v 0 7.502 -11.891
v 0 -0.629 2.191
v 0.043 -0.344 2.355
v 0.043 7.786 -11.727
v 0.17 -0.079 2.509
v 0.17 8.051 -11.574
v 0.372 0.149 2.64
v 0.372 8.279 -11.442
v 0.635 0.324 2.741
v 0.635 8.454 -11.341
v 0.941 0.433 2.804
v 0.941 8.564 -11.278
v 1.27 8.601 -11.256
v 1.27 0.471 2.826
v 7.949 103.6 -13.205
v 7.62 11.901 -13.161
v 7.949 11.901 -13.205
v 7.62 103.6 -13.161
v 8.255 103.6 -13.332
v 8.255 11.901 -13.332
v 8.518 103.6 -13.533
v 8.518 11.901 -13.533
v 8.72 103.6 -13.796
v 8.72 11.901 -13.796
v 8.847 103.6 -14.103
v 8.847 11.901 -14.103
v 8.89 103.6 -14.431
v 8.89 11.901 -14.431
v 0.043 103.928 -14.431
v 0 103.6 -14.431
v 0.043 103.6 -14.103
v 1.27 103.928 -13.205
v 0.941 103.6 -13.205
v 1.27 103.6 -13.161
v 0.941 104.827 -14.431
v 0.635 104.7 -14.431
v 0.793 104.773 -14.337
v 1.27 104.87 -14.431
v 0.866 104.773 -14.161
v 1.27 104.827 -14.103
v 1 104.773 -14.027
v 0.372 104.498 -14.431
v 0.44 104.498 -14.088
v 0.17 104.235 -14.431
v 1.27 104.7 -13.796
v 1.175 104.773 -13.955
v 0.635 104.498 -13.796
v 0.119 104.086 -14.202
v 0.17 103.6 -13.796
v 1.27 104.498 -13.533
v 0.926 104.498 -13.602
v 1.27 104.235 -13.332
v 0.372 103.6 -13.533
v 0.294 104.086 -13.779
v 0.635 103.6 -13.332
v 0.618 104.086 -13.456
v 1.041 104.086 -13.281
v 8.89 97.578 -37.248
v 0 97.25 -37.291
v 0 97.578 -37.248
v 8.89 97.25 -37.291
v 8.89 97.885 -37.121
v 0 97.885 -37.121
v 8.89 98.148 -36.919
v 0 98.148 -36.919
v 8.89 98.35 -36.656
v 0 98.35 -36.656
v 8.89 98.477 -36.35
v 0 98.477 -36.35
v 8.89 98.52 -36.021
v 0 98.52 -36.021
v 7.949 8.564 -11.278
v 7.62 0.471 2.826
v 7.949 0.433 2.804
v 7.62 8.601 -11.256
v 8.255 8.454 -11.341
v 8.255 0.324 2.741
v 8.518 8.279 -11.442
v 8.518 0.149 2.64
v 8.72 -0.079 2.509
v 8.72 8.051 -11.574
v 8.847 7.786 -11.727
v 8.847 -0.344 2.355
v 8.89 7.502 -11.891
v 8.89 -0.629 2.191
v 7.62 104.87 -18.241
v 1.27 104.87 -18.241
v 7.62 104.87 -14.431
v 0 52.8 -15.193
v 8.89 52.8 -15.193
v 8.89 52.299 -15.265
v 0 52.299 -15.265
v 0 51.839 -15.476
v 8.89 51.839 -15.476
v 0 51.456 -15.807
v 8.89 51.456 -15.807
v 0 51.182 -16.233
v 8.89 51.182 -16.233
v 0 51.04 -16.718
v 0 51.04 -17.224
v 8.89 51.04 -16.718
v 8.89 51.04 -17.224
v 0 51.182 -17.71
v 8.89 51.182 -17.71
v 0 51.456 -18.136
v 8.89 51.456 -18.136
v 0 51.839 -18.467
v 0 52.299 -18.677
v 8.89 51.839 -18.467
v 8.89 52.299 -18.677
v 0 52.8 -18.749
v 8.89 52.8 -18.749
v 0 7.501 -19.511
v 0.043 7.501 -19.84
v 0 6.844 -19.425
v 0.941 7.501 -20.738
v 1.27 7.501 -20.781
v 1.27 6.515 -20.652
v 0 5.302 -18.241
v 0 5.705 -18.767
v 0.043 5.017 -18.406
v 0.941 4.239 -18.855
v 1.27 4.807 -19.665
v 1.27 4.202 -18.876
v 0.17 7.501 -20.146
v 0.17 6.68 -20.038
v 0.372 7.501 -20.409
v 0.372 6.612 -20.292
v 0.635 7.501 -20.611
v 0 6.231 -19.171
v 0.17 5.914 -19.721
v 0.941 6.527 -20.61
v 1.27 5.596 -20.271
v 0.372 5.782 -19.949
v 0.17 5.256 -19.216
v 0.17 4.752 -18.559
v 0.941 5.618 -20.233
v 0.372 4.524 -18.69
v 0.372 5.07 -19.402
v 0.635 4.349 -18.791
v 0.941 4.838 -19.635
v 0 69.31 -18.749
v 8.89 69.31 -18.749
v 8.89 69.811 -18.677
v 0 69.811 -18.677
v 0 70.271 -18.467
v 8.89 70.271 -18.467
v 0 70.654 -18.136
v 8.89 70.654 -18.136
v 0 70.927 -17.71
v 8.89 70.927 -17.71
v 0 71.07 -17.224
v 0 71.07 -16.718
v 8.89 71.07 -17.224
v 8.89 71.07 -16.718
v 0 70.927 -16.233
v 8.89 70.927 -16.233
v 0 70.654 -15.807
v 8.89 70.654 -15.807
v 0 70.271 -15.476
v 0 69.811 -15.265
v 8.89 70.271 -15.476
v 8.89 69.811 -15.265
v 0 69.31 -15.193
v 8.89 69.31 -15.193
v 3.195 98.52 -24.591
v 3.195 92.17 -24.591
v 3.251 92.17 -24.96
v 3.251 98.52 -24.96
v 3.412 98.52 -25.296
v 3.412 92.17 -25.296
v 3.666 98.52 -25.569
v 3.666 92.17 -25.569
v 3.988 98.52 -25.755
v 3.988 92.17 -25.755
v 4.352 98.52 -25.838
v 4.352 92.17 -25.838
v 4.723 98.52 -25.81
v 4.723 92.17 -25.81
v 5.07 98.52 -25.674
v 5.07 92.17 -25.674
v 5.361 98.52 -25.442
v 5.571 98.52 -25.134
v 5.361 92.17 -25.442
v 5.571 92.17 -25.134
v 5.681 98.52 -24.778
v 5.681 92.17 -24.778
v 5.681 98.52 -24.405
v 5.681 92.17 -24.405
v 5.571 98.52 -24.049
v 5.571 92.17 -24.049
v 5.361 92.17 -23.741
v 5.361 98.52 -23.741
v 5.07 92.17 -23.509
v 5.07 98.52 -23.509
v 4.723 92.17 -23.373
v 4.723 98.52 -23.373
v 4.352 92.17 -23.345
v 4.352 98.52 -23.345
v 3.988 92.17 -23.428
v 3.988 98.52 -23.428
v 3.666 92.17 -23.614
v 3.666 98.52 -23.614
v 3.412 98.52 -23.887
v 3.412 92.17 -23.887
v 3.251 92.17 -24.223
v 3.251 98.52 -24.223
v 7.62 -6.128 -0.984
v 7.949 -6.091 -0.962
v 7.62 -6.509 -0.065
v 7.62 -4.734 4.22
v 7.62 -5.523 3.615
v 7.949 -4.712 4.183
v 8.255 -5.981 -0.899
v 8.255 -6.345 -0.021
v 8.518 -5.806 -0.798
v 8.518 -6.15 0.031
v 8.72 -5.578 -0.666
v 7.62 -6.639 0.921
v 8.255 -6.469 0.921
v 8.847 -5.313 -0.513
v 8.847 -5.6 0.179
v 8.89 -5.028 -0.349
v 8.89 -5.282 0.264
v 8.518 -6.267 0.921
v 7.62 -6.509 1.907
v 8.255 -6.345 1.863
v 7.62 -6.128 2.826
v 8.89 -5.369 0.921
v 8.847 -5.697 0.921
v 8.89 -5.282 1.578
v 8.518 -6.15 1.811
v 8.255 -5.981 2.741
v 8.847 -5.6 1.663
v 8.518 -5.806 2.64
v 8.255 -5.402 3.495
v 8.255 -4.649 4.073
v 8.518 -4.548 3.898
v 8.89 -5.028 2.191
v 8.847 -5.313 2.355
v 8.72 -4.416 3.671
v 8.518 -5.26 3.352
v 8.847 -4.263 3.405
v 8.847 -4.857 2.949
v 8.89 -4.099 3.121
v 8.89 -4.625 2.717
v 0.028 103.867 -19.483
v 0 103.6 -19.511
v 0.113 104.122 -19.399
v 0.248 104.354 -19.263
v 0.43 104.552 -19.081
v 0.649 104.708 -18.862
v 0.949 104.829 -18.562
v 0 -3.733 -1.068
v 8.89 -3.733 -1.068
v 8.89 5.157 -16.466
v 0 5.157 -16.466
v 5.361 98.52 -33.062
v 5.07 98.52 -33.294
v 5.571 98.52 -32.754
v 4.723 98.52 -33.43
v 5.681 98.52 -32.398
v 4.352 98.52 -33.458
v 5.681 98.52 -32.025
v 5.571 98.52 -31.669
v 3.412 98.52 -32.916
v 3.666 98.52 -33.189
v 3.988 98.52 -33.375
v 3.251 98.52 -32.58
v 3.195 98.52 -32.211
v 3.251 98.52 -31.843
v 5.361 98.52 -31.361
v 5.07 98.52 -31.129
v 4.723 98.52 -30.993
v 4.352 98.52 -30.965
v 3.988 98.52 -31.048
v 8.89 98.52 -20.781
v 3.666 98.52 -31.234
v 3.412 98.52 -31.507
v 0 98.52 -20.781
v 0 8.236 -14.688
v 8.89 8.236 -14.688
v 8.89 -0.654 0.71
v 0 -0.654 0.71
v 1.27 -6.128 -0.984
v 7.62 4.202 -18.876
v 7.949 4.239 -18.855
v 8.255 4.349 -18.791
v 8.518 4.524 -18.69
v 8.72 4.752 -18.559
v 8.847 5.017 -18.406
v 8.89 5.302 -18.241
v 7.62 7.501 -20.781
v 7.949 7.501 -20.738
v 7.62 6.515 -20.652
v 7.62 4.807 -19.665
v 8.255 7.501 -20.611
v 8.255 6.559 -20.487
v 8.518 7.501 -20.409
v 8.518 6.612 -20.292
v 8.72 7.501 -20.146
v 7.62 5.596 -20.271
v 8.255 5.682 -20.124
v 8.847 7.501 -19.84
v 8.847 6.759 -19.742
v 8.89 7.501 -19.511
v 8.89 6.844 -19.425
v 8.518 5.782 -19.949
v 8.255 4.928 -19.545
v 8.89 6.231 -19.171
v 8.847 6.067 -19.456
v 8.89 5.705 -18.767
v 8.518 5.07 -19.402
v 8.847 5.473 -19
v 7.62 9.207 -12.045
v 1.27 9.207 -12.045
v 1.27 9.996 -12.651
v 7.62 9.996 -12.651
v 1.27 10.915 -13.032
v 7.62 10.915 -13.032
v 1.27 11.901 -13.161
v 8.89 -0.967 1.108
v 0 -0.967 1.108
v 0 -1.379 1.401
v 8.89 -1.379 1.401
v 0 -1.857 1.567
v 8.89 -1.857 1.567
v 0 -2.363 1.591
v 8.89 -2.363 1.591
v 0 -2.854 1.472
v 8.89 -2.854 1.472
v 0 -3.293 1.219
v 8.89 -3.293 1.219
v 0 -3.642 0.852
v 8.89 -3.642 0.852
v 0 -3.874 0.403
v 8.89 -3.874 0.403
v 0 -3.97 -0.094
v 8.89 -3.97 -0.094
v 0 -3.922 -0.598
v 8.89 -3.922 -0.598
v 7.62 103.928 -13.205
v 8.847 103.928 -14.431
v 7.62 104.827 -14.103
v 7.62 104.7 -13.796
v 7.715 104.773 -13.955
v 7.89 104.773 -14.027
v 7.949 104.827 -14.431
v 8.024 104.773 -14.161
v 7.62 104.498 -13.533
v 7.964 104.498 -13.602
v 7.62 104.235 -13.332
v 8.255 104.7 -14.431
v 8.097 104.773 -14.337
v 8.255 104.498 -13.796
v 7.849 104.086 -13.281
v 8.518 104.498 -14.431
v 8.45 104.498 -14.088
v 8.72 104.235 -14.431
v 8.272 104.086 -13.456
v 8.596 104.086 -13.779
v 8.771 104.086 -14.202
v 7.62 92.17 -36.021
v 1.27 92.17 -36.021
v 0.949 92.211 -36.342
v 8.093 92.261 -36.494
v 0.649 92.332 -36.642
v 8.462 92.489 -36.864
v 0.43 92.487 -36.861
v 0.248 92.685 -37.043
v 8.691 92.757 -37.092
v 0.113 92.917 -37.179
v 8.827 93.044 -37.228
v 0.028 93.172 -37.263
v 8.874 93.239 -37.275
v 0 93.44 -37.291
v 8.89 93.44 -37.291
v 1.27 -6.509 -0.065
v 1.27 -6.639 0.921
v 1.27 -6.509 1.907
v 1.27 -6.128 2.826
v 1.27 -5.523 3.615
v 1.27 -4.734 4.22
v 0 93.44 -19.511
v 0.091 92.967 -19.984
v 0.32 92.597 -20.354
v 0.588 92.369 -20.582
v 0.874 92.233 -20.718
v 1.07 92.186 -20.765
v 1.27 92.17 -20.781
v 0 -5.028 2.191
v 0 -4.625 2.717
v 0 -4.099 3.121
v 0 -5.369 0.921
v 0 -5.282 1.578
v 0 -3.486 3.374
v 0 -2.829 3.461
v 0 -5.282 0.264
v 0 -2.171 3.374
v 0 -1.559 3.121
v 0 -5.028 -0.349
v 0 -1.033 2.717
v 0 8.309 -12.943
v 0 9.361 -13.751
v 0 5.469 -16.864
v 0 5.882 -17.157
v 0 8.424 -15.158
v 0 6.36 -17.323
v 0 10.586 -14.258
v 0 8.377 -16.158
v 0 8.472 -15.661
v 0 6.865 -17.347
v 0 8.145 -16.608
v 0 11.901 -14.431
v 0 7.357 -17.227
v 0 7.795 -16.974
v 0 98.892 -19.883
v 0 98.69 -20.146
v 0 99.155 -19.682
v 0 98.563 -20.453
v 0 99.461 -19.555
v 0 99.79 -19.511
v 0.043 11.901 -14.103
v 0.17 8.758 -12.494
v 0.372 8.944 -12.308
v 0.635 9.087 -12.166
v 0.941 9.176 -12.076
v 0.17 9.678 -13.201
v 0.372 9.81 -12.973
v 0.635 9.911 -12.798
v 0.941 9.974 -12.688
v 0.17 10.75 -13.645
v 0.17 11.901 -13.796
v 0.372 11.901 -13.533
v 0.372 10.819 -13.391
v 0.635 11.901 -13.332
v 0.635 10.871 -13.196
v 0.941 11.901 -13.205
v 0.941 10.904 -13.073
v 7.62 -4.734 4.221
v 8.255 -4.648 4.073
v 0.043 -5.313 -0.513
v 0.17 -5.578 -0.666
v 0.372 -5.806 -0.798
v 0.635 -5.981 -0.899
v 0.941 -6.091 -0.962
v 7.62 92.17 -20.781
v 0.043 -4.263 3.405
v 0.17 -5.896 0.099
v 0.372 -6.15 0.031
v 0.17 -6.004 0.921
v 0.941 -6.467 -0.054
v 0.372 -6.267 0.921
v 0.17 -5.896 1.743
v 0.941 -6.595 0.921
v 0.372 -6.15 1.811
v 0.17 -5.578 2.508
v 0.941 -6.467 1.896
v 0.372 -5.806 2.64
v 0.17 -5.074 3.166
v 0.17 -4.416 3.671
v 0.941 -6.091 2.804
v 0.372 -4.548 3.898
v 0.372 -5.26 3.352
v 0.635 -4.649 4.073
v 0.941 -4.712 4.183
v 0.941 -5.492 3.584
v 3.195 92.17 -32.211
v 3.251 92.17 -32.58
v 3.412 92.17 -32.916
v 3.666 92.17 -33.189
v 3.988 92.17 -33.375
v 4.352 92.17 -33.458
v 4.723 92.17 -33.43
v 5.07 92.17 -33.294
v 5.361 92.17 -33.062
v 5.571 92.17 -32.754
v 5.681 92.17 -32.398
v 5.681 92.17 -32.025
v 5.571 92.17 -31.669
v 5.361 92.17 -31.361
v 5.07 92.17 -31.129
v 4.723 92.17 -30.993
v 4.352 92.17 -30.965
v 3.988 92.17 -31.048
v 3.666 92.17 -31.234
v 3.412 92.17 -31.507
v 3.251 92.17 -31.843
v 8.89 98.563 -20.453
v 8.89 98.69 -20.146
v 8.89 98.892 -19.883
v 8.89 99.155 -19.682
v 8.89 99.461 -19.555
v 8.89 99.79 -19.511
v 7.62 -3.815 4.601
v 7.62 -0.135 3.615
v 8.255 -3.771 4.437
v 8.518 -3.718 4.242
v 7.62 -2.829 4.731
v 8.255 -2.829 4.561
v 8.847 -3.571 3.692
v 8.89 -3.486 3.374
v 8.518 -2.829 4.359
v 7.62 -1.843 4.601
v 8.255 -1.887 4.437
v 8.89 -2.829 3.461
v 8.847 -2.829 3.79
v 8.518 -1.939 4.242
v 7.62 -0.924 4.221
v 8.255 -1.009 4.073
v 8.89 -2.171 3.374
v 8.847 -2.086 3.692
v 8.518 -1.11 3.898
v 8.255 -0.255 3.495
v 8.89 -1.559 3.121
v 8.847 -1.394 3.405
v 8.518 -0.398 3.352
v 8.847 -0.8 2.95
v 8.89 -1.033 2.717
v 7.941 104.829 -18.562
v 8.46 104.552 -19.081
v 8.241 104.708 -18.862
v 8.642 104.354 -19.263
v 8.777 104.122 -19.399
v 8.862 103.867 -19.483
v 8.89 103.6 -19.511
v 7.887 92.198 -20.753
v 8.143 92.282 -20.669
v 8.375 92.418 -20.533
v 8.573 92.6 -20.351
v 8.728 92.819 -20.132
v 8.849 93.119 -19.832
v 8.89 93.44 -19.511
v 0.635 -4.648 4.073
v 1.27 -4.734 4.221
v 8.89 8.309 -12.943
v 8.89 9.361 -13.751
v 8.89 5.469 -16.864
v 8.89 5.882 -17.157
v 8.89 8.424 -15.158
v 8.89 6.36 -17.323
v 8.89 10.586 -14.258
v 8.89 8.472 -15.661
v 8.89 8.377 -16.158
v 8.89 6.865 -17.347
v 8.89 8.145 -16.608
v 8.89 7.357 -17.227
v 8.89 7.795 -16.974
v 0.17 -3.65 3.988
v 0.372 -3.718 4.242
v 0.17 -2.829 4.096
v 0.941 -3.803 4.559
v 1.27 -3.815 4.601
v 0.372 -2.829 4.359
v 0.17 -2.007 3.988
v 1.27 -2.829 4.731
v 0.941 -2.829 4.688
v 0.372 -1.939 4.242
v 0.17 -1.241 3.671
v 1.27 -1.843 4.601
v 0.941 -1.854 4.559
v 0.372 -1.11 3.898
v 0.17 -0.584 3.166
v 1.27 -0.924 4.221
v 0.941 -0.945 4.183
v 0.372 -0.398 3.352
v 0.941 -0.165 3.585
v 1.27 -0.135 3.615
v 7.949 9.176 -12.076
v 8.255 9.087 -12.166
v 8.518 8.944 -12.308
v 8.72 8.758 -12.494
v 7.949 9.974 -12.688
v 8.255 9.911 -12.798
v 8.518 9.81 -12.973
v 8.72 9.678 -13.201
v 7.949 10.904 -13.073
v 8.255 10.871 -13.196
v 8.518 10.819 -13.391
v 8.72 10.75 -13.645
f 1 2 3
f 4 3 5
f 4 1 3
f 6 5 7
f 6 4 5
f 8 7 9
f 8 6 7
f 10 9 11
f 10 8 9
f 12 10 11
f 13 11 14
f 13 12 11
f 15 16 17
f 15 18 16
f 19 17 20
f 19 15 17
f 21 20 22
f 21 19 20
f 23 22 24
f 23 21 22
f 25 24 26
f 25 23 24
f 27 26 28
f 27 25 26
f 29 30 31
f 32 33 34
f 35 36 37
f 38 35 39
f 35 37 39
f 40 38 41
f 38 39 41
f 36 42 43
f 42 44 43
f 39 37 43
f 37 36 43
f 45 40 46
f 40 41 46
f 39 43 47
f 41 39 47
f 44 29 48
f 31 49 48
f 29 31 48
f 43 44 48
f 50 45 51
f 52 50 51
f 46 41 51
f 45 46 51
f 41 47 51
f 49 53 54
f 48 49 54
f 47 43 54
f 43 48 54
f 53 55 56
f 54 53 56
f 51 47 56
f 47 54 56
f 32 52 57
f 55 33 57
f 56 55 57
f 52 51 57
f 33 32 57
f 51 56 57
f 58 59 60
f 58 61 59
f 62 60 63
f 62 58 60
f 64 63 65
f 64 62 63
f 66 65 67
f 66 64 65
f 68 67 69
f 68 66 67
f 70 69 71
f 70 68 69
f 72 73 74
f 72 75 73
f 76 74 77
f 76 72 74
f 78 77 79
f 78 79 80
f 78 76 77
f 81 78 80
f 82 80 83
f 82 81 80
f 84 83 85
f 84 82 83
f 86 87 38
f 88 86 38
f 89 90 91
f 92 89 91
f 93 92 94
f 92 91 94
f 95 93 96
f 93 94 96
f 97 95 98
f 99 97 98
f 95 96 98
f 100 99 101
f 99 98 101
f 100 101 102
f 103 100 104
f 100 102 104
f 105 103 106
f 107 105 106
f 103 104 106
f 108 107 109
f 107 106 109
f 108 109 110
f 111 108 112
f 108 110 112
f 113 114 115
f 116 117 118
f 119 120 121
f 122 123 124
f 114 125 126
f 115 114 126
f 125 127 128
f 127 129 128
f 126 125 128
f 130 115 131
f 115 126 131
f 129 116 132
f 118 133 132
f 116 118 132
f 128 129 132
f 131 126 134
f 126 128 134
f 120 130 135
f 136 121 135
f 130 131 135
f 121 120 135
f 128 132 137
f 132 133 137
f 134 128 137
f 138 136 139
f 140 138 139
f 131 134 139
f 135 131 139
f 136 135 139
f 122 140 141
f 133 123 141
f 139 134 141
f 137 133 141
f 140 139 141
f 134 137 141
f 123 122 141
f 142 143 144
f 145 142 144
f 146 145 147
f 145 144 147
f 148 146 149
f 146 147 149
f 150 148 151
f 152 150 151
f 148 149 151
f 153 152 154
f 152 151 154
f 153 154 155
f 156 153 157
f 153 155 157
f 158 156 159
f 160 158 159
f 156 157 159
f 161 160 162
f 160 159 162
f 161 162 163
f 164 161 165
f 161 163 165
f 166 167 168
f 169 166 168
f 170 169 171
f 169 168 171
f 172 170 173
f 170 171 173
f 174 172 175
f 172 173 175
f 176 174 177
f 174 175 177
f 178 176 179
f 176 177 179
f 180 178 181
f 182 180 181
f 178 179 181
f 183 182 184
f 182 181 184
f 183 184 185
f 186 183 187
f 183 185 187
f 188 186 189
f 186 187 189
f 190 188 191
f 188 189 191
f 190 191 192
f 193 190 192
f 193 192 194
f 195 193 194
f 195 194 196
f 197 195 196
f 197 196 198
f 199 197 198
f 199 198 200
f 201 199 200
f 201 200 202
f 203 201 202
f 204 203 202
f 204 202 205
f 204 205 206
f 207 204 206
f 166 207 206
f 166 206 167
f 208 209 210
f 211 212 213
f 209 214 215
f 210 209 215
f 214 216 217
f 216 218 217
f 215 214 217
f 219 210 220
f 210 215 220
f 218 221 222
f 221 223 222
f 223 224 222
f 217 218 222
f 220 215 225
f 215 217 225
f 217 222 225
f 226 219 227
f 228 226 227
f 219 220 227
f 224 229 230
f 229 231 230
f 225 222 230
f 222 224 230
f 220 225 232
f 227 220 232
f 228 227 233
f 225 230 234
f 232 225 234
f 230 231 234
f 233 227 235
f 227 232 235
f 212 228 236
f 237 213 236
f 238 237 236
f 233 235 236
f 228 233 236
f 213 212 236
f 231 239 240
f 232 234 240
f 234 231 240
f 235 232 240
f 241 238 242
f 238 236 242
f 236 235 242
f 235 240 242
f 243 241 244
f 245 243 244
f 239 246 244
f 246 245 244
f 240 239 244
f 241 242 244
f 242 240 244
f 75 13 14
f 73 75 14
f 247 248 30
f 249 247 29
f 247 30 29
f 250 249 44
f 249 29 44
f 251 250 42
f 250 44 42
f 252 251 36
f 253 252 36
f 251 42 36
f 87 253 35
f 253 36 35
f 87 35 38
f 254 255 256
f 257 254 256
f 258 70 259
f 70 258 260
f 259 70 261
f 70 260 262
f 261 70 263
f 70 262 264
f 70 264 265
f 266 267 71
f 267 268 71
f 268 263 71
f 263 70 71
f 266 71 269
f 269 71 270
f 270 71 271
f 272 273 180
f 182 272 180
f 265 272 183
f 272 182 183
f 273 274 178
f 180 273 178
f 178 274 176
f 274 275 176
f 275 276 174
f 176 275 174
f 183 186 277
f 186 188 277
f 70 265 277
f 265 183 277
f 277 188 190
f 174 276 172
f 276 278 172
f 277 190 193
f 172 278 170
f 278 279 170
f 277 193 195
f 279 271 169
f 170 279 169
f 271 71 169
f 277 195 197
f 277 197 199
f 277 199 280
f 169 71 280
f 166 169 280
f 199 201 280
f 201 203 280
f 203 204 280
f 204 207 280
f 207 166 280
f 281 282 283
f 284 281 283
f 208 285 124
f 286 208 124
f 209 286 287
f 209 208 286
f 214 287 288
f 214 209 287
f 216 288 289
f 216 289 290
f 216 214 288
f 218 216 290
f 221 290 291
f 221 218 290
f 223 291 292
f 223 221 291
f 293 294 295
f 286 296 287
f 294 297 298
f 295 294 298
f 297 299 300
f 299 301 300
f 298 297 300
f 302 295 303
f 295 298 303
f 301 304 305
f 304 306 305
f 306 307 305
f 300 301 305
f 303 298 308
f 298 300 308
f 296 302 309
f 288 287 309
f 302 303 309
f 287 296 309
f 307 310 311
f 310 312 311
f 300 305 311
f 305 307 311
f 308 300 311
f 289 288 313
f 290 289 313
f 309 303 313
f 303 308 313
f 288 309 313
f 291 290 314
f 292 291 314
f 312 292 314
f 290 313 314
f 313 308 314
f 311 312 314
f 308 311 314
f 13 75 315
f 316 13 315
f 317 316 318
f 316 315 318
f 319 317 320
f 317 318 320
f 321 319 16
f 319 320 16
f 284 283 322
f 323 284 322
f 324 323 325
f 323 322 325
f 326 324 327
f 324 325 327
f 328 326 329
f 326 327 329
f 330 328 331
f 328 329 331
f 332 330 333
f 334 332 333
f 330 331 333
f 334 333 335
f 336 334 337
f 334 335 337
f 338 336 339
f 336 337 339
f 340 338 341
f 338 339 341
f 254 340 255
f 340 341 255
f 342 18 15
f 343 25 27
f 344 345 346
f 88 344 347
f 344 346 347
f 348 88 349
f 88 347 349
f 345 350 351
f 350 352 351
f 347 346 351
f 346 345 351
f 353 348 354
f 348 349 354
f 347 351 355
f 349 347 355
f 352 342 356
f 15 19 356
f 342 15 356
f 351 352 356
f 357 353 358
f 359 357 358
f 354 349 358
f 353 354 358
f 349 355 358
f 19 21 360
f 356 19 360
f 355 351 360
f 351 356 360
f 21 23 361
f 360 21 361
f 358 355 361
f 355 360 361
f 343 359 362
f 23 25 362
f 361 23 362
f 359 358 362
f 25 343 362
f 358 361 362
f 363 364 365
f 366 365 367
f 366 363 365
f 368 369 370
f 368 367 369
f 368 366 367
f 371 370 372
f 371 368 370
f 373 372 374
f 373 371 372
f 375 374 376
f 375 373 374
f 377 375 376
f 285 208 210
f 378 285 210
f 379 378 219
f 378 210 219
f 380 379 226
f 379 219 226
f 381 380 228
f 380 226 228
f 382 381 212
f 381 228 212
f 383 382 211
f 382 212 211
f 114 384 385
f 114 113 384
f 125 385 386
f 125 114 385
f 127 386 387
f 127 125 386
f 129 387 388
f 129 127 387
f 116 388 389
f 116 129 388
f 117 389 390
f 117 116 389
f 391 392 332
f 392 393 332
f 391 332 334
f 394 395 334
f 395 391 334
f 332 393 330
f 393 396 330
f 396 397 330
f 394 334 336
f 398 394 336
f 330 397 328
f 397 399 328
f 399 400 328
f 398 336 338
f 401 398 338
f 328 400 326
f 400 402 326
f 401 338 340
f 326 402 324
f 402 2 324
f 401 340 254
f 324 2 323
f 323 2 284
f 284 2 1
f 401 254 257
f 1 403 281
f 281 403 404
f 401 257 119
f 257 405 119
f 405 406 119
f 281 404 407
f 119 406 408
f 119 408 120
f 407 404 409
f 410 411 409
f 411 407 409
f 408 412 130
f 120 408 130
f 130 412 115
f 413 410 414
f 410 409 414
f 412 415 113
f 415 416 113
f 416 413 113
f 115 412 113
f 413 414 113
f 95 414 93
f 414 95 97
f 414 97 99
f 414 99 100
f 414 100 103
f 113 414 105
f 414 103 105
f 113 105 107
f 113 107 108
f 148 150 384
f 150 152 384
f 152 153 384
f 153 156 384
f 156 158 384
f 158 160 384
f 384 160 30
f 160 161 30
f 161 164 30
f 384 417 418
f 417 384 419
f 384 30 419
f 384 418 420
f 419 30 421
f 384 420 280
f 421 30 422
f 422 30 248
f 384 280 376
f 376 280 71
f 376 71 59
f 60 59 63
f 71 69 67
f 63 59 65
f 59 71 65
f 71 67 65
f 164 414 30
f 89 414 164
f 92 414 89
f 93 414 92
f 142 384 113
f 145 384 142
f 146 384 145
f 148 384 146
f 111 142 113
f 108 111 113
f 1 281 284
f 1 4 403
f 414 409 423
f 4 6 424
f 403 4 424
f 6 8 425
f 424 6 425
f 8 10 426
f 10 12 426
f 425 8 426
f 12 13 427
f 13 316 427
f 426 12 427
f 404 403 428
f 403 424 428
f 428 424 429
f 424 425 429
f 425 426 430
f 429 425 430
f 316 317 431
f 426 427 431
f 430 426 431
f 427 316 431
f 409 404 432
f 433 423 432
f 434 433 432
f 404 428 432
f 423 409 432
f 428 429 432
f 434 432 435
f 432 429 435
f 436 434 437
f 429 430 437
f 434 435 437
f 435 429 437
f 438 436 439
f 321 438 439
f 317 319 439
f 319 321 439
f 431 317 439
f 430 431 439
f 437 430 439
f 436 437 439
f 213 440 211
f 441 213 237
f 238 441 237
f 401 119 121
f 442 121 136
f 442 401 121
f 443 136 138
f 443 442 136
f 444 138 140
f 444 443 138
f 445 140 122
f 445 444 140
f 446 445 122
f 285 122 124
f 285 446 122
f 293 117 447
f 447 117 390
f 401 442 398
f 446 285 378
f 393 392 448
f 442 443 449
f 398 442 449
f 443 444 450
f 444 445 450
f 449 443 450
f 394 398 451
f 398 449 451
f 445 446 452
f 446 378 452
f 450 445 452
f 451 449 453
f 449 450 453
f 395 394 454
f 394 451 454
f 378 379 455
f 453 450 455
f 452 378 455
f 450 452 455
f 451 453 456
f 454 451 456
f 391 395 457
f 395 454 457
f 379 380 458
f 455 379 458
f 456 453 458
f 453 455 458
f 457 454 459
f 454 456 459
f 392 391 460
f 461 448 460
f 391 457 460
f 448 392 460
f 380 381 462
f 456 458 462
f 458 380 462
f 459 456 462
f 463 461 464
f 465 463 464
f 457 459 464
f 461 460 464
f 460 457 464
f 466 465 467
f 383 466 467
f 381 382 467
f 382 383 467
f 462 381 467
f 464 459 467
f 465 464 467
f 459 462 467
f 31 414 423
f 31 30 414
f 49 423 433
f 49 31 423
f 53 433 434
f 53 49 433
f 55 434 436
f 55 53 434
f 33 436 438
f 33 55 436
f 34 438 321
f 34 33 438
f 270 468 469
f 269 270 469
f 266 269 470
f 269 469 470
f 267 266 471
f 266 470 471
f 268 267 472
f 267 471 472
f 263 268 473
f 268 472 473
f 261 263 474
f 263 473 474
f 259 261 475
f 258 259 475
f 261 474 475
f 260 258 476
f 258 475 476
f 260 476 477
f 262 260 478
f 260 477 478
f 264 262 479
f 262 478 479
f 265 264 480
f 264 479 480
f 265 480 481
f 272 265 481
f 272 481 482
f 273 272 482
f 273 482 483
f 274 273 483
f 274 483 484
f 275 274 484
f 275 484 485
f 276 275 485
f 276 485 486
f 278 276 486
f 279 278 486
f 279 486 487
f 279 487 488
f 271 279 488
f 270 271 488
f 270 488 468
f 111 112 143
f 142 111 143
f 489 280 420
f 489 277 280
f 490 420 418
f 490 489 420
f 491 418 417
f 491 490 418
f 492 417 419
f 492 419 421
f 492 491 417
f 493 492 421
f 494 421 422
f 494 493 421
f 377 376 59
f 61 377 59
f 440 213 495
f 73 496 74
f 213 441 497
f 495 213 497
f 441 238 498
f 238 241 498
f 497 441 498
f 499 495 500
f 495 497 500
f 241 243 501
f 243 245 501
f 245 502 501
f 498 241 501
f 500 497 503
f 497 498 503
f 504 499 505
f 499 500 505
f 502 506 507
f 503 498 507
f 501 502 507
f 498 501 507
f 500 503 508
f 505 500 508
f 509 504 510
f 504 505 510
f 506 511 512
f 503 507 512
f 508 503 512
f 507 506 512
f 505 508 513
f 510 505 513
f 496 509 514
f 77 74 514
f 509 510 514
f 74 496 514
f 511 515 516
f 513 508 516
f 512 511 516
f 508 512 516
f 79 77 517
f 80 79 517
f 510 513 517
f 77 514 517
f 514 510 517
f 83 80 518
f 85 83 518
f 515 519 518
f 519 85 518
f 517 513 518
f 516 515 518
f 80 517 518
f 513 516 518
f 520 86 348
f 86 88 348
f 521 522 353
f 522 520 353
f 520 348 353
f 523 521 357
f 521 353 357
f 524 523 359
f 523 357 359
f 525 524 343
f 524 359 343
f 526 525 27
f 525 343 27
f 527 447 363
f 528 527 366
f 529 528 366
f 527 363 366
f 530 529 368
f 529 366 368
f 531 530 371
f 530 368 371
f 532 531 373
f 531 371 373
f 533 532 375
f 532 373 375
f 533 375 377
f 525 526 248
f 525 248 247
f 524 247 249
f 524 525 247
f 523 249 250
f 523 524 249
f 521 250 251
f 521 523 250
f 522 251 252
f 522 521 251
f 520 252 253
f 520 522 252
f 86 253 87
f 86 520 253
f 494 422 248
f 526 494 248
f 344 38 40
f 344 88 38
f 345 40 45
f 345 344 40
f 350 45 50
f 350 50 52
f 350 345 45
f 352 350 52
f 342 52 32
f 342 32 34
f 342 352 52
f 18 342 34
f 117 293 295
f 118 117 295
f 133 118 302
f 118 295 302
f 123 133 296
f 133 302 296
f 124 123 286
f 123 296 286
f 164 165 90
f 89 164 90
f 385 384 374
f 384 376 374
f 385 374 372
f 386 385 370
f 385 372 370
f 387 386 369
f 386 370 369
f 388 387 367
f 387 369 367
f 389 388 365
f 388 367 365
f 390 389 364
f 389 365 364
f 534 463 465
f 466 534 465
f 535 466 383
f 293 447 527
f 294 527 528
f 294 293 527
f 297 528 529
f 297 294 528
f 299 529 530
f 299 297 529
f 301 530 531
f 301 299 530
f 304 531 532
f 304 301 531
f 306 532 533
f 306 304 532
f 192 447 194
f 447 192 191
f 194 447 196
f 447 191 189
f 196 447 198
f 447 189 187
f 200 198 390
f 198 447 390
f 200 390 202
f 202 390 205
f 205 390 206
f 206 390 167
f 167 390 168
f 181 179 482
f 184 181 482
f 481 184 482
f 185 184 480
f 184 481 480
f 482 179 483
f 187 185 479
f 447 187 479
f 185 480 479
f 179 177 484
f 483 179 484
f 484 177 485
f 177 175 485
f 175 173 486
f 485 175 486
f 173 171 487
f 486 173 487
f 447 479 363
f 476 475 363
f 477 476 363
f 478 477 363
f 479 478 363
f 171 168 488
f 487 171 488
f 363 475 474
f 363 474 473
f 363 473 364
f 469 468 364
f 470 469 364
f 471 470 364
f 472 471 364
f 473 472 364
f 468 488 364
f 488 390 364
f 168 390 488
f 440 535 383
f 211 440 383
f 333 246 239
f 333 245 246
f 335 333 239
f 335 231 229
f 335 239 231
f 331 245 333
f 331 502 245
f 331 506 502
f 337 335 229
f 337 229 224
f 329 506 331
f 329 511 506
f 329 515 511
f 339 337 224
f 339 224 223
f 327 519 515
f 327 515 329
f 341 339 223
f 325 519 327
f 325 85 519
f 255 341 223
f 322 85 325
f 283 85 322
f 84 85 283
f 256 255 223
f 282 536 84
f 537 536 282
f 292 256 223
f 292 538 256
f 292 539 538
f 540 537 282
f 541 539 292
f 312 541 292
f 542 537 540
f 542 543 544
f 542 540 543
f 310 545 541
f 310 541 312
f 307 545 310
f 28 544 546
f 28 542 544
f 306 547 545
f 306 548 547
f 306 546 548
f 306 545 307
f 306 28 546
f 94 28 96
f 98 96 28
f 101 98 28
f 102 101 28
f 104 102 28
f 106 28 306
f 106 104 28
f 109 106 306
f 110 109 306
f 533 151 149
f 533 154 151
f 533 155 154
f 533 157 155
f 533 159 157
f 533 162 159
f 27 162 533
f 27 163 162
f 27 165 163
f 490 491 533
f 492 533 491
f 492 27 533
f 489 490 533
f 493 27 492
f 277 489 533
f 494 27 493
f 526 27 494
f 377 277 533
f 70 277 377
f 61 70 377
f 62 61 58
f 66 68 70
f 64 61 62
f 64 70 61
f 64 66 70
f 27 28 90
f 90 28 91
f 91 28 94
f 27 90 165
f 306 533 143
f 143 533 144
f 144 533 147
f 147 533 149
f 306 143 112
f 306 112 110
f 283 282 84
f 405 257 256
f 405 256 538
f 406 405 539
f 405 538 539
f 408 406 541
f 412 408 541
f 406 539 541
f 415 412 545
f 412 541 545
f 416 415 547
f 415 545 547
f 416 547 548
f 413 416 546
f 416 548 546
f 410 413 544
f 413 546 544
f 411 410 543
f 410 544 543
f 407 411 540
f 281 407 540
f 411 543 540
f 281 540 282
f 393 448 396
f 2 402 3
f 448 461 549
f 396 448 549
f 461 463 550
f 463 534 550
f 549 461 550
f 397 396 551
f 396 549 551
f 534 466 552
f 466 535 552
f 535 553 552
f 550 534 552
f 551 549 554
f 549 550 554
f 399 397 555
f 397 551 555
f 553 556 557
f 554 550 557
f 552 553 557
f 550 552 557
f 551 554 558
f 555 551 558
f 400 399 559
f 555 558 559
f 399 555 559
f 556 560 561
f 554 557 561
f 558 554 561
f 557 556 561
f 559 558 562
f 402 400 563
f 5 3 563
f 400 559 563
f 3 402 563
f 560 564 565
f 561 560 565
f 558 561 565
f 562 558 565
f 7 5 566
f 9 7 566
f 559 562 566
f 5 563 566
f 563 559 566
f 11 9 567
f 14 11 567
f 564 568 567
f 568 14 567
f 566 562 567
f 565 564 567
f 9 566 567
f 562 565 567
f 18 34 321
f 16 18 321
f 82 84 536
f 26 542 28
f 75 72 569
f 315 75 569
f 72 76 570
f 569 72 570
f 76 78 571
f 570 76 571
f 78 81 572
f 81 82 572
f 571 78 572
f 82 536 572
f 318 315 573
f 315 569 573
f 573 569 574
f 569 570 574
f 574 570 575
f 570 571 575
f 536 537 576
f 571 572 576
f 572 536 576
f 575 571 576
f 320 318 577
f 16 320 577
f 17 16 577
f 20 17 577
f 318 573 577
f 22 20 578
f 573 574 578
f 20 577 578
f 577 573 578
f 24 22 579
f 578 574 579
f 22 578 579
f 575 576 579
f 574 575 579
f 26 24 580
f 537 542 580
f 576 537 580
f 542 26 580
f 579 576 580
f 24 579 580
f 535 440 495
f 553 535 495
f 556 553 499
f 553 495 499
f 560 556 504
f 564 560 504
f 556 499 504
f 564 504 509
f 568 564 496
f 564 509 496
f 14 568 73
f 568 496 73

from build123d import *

# Parameters (mm, degrees)
BOSS_EXTRUDE1_DEPTH     = 8.89
CUT_EXTRUDE1_DEPTH      = 10.16
CUT_EXTRUDE2_DEPTH      = 10.16
TAP_DRILL_FOR_M3_TAP1_D = 2.5
FILLET5_R               = 1.27
FILLET6_R               = 3.81
FILLET7_R               = 1.27


with BuildPart() as part:
    # Sketch1 → Boss-Extrude1 (new body)
    with BuildSketch(Plane(origin=(0, 0, 0), x_dir=(0, 0, -1), z_dir=(1, 0, 0))):
        Polygon((-2.31554316, -8.033202767), (20.781354359, 5.301797233), (20.781354359, 92.169797233), (37.291354359, 92.169797233), (37.291354359, 98.519797233), (19.511354359, 98.519797233), (19.511354359, 104.869797233), (13.161354359, 104.869797233), (13.161354359, 9.701206284), (-6.12554316, -1.43408919), align=None)
    extrude(amount=BOSS_EXTRUDE1_DEPTH)

    # Sketch2 → Cut-Extrude1 (cut)
    with BuildSketch(Plane(origin=(8.89, 0, 0), x_dir=(0, 0, -1), z_dir=(1, 0, 0))):
        with BuildLine():
            Line((1.067865891, -3.733439147), (16.465797571, 5.156560853))
            ThreePointArc((16.465797571, 5.156560853), (17.116590739, 7.585354021), (14.687797571, 8.236147189))
            Line((14.687797571, 8.236147189), (-0.710134109, -0.653852811))
            ThreePointArc((-0.710134109, -0.653852811), (-1.360927276, -3.082645979), (1.067865891, -3.733439147))
        make_face()
    extrude(amount=-CUT_EXTRUDE1_DEPTH, mode=Mode.SUBTRACT)

    # Sketch3 → Cut-Extrude2 (cut)
    with BuildSketch(Plane(origin=(8.89, 0, 0), x_dir=(0, 0, -1), z_dir=(1, 0, 0))):
        with BuildLine():
            Line((15.193354359, 69.309797233), (15.193354359, 52.799797233))
            ThreePointArc((15.193354359, 52.799797233), (16.971354359, 51.021797233), (18.749354359, 52.799797233))
            Line((18.749354359, 52.799797233), (18.749354359, 69.309797233))
            ThreePointArc((18.749354359, 69.309797233), (16.971354359, 71.087797233), (15.193354359, 69.309797233))
        make_face()
    extrude(amount=-CUT_EXTRUDE2_DEPTH, mode=Mode.SUBTRACT)

    # Tap Drill for M3 Tap1 (through all)
    with Locations(Plane(origin=(0, 98.519797233, 0), x_dir=(1, 0, 0), z_dir=(0, 1, 0))):
        with Locations((4.445, 32.211354359), (4.445, 24.591354359)):
            Hole(TAP_DRILL_FOR_M3_TAP1_D / 2)

    # Fillet5
    fillet5_edges = [part.edges().sort_by_distance(p)[0] for p in [
        (4.445, 98.519797233, -19.511354359),
        (4.445, 98.519797233, -37.291354359),
    ]]
    fillet(fillet5_edges, radius=FILLET5_R)

    # Fillet6
    fillet6_edges = [part.edges().sort_by_distance(p)[0] for p in [
        (4.445, 9.701206284, -13.161354359),
        (4.445, 5.301797233, -20.781354359),
        (4.445, -8.033202767, 2.31554316),
        (4.445, -1.43408919, 6.12554316),
    ]]
    fillet(fillet6_edges, radius=FILLET6_R - 0.0001)  # a hair under: the kernel refuses the full size

    # Fillet7
    fillet7_edges = [part.edges().sort_by_distance(p)[0] for p in [
        (8.89, 5.596494023, -20.270924545),
        (0, 9.995903075, -12.650924545),
        (8.89, 9.995903075, -12.650924545),
        (0, 104.869797233, -16.336354359),
        (0, 92.169797233, -29.036354359),
        (8.89, 92.169797233, -29.036354359),
        (4.445, 104.869797233, -13.161354359),
        (4.445, 104.869797233, -19.511354359),
        (4.445, 92.169797233, -37.291354359),
        (8.89, 104.869797233, -16.336354359),
        (8.89, 58.385325154, -13.161354359),
        (0, 4.536121849, -4.215165693),
        (8.89, 4.536121849, -4.215165693),
        (0, 49.835620628, -20.781354359),
        (8.89, 49.835620628, -20.781354359),
        (0, -0.963139465, -9.930165693),
        (0, -1.842534696, 4.601203779),
        (0, -6.508863387, 1.907097654),
        (0, 5.596494023, -20.270924545),
        (0, 58.385325154, -13.161354359),
        (8.89, -0.963139465, -9.930165693),
        (8.89, -1.842534696, 4.601203779),
        (8.89, -6.508863387, 1.907097654),
    ]]
    fillet(fillet7_edges, radius=FILLET7_R)


solid = part.part
